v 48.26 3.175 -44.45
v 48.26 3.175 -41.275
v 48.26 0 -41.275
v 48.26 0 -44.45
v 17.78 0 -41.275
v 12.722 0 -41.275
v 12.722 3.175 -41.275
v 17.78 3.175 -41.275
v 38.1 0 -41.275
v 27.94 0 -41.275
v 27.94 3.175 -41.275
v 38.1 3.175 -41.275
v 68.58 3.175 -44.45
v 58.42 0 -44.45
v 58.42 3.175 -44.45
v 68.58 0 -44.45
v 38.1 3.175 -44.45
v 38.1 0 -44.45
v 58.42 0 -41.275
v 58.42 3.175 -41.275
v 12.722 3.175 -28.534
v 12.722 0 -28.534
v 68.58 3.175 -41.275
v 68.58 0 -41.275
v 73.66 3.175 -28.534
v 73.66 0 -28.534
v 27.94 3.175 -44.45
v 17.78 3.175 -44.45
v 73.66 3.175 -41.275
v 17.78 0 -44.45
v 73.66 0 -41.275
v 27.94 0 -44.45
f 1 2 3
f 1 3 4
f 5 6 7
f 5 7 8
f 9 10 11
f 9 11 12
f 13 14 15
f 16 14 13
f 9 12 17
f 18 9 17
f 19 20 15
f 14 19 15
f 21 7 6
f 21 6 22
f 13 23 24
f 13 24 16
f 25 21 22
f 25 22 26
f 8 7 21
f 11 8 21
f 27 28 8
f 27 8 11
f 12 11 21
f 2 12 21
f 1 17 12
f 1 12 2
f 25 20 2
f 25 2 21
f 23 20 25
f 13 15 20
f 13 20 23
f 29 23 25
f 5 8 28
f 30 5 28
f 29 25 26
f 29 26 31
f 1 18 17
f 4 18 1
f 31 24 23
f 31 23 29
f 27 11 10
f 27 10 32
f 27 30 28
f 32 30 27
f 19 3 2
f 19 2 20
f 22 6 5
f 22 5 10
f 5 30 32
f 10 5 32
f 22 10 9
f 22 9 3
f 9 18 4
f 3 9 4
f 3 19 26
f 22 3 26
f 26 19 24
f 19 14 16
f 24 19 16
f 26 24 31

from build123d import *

# Parameters (mm, degrees)
SKETCH1_W                     = 10.16
SKETCH1_H                     = 3.175
SKETCH1_W_2                   = 152.4
SKETCH1_H_2                   = 82.55
SKETCH1_R                     = 7.747
MAIN_EXTRUDE_DEPTH            = 3.175
SKETCH2_R                     = 2.54
CASTER_MOUNTING_HOLES_DEPTH   = 89.274136218
SKETCH3_W                     = 2.54
SKETCH3_H                     = 82.55
REMOVE_UNEVEN_BACK_EDGE_DEPTH = 89.274136218
CUT_EXTRUDE2_DEPTH            = 89.274136218


with BuildPart() as part:
    # Sketch1 → Main Extrude (new body)
    # profile 1 of 7: a face of its own
    with BuildSketch(Plane(origin=(0, 0, 0), x_dir=(1, 0, 0), z_dir=(0, 1, 0))):
        with Locations((43.18, -42.8625)):
            Rectangle(SKETCH1_W, SKETCH1_H)
    # profile 2 of 7: a face of its own
    with BuildSketch(Plane(origin=(0, 0, 0), x_dir=(1, 0, 0), z_dir=(0, 1, 0))):
        Rectangle(SKETCH1_W_2, SKETCH1_H_2)
        with Locations(Location((-65.076590574, 0, 0), (0, 0, 270))):
            Circle(SKETCH1_R, mode=Mode.SUBTRACT)
    # profile 3 of 7: a face of its own
    with BuildSketch(Plane(origin=(0, 0, 0), x_dir=(1, 0, 0), z_dir=(0, 1, 0))):
        with Locations((63.5, -42.8625)):
            Rectangle(SKETCH1_W, SKETCH1_H)
    # profile 4 of 7: a face of its own
    with BuildSketch(Plane(origin=(0, 0, 0), x_dir=(1, 0, 0), z_dir=(0, 1, 0))):
        with Locations((22.86, -42.8625)):
            Rectangle(SKETCH1_W, SKETCH1_H)
    # profile 5 of 7: a face of its own
    with BuildSketch(Plane(origin=(0, 0, 0), x_dir=(1, 0, 0), z_dir=(0, 1, 0))):
        with Locations((63.5, 42.8625)):
            Rectangle(SKETCH1_W, SKETCH1_H)
    # profile 6 of 7: a face of its own
    with BuildSketch(Plane(origin=(0, 0, 0), x_dir=(1, 0, 0), z_dir=(0, 1, 0))):
        with Locations((43.18, 42.8625)):
            Rectangle(SKETCH1_W, SKETCH1_H)
    # profile 7 of 7: a face of its own
    with BuildSketch(Plane(origin=(0, 0, 0), x_dir=(1, 0, 0), z_dir=(0, 1, 0))):
        with Locations((22.86, 42.8625)):
            Rectangle(SKETCH1_W, SKETCH1_H)
    extrude(amount=MAIN_EXTRUDE_DEPTH)

    # Sketch2 → Caster Mounting Holes (cut, through all)
    with BuildSketch(Plane(origin=(0, 3.175, 0), x_dir=(1, 0, 0), z_dir=(0, 1, 0))):
        with Locations(Location((-47.3754273, 15.24, 0), (0, 0, 270))):
            Circle(SKETCH2_R)
        with Locations(Location((-23.4994273, 15.24, 0), (0, 0, 270))):
            Circle(SKETCH2_R)
        with Locations(Location((-23.4994273, -15.24, 0), (0, 0, 270))):
            Circle(SKETCH2_R)
        with Locations(Location((-47.3754273, -15.24, 0), (0, 0, 270))):
            Circle(SKETCH2_R)
    extrude(amount=-CASTER_MOUNTING_HOLES_DEPTH, mode=Mode.SUBTRACT)

    # Sketch3 → Remove Uneven Back Edge (cut, through all)
    with BuildSketch(Plane(origin=(0, 3.175, 0), x_dir=(1, 0, 0), z_dir=(0, 1, 0))):
        with Locations((74.93, 0)):
            Rectangle(SKETCH3_W, SKETCH3_H)
    extrude(amount=-REMOVE_UNEVEN_BACK_EDGE_DEPTH, mode=Mode.SUBTRACT)

    # Sketch4 → Cut-Extrude2 (cut, through all)
    with BuildSketch(Plane(origin=(0, 3.175, 0), x_dir=(1, 0, 0), z_dir=(0, 1, 0))):
        Polygon((12.722439957, 54.007099157), (12.722439957, 28.534320342), (84.718317581, 28.534320342), (84.718317581, -50.041057477), (-114.731091279, -51.937564591), (-115.738488642, 54.007099157), align=None)
    extrude(amount=-CUT_EXTRUDE2_DEPTH, mode=Mode.SUBTRACT)


solid = part.part
